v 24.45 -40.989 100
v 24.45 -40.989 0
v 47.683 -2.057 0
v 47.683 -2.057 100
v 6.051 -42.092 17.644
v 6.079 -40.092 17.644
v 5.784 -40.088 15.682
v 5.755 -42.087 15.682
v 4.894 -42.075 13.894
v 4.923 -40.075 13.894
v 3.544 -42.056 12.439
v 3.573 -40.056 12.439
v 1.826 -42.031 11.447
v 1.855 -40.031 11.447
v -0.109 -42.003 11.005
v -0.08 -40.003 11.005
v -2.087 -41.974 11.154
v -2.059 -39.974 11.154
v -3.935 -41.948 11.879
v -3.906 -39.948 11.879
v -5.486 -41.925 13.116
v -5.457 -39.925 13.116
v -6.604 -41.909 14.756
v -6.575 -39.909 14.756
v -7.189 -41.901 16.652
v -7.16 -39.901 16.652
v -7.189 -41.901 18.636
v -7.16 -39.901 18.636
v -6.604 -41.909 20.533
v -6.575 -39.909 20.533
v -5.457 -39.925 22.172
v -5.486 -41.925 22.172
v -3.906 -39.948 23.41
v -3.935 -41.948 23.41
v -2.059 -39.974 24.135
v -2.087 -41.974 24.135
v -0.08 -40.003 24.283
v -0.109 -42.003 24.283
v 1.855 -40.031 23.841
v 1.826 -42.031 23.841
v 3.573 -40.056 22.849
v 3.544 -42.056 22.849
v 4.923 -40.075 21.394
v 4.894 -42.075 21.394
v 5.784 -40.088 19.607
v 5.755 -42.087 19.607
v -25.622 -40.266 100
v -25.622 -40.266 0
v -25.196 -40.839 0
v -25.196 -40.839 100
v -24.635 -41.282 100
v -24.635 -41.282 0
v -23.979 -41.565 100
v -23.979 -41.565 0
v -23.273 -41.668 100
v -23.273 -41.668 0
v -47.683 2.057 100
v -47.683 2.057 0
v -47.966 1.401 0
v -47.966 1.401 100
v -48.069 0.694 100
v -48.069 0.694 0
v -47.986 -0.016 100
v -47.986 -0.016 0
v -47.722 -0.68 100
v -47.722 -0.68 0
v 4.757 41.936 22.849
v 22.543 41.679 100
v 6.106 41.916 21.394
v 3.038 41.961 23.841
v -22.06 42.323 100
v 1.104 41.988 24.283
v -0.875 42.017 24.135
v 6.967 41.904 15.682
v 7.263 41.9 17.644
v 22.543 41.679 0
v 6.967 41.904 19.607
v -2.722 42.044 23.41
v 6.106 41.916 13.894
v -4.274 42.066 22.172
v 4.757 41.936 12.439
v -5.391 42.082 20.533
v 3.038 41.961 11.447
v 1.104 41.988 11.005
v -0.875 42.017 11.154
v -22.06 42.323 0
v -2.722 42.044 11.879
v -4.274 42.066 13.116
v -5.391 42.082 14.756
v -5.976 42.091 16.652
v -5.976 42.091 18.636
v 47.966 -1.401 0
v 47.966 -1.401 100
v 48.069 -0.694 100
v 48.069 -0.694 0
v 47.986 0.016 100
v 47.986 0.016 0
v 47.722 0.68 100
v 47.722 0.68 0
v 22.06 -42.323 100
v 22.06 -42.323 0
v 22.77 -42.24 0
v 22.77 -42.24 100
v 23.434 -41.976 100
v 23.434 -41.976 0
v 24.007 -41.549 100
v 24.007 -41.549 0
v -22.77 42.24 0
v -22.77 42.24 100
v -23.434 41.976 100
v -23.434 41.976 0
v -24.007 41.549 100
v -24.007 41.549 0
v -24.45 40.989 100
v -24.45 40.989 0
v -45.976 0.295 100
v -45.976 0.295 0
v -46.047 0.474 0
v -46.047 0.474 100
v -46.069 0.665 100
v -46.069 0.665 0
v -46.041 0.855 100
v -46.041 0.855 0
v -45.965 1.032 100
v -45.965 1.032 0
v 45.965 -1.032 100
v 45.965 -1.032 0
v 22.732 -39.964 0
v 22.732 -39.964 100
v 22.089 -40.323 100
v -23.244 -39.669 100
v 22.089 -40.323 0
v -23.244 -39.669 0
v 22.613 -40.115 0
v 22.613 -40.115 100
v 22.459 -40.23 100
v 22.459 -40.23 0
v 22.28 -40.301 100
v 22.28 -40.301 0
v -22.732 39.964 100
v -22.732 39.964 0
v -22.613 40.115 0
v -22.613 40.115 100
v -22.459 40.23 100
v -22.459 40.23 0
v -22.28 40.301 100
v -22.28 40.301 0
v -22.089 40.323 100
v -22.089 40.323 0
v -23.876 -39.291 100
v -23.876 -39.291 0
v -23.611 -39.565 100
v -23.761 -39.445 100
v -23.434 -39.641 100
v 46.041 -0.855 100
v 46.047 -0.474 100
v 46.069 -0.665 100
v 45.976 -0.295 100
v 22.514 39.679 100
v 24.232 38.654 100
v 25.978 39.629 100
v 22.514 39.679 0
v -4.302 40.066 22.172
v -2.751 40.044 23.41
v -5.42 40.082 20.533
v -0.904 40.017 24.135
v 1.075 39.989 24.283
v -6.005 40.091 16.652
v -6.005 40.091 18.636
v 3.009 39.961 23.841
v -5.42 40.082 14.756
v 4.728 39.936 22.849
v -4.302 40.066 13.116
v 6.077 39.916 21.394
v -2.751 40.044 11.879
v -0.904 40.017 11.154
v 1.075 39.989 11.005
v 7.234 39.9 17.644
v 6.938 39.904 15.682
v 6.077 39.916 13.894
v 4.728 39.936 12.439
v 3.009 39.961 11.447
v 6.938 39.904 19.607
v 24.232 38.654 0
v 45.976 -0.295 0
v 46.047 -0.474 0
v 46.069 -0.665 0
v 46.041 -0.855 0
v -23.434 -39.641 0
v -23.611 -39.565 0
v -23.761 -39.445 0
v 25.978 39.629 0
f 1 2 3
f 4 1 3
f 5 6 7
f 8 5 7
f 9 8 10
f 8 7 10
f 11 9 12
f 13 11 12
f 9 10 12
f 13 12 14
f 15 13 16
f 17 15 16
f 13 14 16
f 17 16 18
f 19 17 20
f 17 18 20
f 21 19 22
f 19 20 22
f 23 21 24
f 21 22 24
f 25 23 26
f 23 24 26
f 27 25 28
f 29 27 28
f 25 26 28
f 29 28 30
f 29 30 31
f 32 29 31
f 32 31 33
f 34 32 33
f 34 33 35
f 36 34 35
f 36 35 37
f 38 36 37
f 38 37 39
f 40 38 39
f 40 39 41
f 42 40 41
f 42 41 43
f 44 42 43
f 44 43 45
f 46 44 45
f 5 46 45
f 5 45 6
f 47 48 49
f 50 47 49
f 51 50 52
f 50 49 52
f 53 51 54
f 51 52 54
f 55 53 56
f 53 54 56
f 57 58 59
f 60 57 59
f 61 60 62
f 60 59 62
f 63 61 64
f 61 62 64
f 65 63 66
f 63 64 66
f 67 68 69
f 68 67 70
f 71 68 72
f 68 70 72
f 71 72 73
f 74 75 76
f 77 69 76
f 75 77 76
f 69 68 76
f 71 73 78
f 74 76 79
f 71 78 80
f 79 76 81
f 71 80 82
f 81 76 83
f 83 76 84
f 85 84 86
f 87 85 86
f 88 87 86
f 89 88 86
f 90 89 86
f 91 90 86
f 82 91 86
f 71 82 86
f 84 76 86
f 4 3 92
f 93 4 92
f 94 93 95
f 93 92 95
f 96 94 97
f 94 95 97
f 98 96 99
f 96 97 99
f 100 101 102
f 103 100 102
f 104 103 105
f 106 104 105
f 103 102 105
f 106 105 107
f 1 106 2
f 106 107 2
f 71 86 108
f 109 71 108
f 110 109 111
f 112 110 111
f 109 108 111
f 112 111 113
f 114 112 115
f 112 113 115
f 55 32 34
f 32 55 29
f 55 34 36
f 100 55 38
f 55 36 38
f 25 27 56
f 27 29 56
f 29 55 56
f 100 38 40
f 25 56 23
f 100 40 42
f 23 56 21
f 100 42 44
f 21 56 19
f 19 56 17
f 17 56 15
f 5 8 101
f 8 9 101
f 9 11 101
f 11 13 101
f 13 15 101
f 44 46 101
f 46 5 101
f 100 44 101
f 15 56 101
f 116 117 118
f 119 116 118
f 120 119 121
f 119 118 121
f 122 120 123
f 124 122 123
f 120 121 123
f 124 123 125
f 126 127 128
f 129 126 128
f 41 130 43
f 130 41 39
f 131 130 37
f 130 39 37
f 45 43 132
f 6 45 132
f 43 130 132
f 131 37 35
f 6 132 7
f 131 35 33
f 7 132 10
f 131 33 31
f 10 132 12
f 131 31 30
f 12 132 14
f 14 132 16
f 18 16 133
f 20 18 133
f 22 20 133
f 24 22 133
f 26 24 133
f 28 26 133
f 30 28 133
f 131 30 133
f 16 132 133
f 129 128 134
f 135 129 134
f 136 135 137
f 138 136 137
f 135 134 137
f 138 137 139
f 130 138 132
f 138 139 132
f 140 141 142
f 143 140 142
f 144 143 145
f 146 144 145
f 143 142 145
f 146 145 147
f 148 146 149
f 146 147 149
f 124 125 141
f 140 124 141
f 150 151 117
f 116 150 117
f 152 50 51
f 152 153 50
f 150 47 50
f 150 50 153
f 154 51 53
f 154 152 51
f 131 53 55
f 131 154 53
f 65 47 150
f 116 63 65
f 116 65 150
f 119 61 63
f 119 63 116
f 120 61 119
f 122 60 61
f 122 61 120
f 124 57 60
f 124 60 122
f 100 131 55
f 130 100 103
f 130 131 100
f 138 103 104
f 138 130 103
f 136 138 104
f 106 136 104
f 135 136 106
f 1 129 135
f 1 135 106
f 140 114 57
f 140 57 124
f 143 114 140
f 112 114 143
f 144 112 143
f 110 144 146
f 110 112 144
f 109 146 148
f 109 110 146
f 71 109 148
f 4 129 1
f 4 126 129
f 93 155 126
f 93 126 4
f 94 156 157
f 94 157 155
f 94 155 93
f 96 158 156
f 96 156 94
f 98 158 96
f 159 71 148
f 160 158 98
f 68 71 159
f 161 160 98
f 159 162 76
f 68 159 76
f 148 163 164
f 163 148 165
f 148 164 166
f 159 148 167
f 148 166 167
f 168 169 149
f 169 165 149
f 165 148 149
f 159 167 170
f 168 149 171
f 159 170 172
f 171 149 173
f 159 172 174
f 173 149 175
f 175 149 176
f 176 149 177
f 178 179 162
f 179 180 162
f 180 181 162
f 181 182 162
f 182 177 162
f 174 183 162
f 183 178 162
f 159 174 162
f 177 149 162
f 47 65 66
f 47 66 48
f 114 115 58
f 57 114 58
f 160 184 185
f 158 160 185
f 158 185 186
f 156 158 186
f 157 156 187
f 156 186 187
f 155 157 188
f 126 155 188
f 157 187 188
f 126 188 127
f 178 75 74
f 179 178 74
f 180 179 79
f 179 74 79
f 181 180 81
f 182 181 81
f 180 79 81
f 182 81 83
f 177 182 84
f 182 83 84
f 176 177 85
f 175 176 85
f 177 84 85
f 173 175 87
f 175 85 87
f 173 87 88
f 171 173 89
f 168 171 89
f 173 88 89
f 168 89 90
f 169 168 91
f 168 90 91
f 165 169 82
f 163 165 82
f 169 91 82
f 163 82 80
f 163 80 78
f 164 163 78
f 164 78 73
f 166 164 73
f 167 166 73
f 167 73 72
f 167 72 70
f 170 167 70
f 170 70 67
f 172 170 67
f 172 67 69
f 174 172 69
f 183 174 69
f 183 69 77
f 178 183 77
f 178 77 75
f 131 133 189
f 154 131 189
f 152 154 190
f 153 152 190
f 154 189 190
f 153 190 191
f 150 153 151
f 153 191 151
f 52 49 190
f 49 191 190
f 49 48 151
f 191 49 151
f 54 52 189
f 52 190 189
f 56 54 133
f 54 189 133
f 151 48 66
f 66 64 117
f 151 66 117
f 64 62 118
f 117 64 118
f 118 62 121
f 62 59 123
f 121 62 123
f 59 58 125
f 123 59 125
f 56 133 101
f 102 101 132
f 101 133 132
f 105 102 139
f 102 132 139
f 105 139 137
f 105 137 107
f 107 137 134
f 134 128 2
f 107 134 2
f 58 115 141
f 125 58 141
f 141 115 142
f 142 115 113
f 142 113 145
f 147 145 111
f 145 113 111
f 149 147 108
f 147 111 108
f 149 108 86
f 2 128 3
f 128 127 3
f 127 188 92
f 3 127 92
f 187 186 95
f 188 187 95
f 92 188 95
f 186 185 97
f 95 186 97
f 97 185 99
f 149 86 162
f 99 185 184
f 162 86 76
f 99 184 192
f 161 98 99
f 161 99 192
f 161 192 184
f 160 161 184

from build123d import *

# Parameters (mm, degrees)
LOFTED_BENDS1_DEPTH = 100
SKETCH8_R           = 6.657402664
CUT_EXTRUDE1_DEPTH  = 130


# Read off the part's stored shape, not the designer's step: Lofted Bends1
with BuildPart() as part:
    # Lofted Bends1 outline → Lofted Bends1 (new body)
    with BuildSketch(Plane.XY):
        with BuildLine():
            Line((47.722213143, 0.679631709), (25.978056207, 39.629205506))
            Line((25.978056207, 39.629205506), (24.23175354, 38.654307053))
            Line((24.23175354, 38.654307053), (45.975910476, -0.295266745))
            ThreePointArc((45.975910476, -0.295266745), (46.069270486, -0.664952643), (45.965279678, -1.031790027))
            Line((45.965279678, -1.031790027), (22.732246736, -39.963939806))
            ThreePointArc((22.732246736, -39.963939806), (22.458769362, -40.229634896), (22.089083464, -40.322994907))
            Line((22.089083464, -40.322994907), (-23.24366374, -39.668673062))
            ThreePointArc((-23.24366374, -39.668673062), (-23.610501124, -39.564682253), (-23.876196214, -39.291204879))
            Line((-23.876196214, -39.291204879), (-45.975910476, 0.295266745))
            ThreePointArc((-45.975910476, 0.295266745), (-46.069270486, 0.664952643), (-45.965279678, 1.031790027))
            Line((-45.965279678, 1.031790027), (-22.732246736, 39.963939806))
            ThreePointArc((-22.732246736, 39.963939806), (-22.458769362, 40.229634896), (-22.089083464, 40.322994907))
            Line((-22.089083464, 40.322994907), (22.514315379, 39.679200299))
            Line((22.514315379, 39.679200299), (22.543179886, 41.678991998))
            Line((22.543179886, 41.678991998), (-22.060218957, 42.322786606))
            ThreePointArc((-22.060218957, 42.322786606), (-23.433667815, 41.975937564), (-24.449684896, 40.988833052))
            Line((-24.449684896, 40.988833052), (-47.682717838, 2.056683273))
            ThreePointArc((-47.682717838, 2.056683273), (-48.069062185, 0.69381715), (-47.722213143, -0.679631709))
            Line((-47.722213143, -0.679631709), (-25.622498881, -40.266103333))
            ThreePointArc((-25.622498881, -40.266103333), (-24.63539437, -41.282120414), (-23.272528247, -41.668464761))
            Line((-23.272528247, -41.668464761), (22.060218957, -42.322786606))
            ThreePointArc((22.060218957, -42.322786606), (23.433667815, -41.975937564), (24.449684896, -40.988833052))
            Line((24.449684896, -40.988833052), (47.682717838, -2.056683273))
            ThreePointArc((47.682717838, -2.056683273), (48.069062185, -0.69381715), (47.722213143, 0.679631709))
        make_face()
    extrude(amount=LOFTED_BENDS1_DEPTH)

    # Sketch8 → Cut-Extrude1 (cut)
    with BuildSketch(Plane(origin=(0.606154645, 41.995625683, 0), x_dir=(0.9998958496065499, -0.014432253448298253, 0), z_dir=(0.014432253448298252, 0.9998958496065498, 0))):
        with Locations((0, -17.644210067)):
            Circle(SKETCH8_R)
    extrude(amount=-CUT_EXTRUDE1_DEPTH, mode=Mode.SUBTRACT)


solid = part.part
